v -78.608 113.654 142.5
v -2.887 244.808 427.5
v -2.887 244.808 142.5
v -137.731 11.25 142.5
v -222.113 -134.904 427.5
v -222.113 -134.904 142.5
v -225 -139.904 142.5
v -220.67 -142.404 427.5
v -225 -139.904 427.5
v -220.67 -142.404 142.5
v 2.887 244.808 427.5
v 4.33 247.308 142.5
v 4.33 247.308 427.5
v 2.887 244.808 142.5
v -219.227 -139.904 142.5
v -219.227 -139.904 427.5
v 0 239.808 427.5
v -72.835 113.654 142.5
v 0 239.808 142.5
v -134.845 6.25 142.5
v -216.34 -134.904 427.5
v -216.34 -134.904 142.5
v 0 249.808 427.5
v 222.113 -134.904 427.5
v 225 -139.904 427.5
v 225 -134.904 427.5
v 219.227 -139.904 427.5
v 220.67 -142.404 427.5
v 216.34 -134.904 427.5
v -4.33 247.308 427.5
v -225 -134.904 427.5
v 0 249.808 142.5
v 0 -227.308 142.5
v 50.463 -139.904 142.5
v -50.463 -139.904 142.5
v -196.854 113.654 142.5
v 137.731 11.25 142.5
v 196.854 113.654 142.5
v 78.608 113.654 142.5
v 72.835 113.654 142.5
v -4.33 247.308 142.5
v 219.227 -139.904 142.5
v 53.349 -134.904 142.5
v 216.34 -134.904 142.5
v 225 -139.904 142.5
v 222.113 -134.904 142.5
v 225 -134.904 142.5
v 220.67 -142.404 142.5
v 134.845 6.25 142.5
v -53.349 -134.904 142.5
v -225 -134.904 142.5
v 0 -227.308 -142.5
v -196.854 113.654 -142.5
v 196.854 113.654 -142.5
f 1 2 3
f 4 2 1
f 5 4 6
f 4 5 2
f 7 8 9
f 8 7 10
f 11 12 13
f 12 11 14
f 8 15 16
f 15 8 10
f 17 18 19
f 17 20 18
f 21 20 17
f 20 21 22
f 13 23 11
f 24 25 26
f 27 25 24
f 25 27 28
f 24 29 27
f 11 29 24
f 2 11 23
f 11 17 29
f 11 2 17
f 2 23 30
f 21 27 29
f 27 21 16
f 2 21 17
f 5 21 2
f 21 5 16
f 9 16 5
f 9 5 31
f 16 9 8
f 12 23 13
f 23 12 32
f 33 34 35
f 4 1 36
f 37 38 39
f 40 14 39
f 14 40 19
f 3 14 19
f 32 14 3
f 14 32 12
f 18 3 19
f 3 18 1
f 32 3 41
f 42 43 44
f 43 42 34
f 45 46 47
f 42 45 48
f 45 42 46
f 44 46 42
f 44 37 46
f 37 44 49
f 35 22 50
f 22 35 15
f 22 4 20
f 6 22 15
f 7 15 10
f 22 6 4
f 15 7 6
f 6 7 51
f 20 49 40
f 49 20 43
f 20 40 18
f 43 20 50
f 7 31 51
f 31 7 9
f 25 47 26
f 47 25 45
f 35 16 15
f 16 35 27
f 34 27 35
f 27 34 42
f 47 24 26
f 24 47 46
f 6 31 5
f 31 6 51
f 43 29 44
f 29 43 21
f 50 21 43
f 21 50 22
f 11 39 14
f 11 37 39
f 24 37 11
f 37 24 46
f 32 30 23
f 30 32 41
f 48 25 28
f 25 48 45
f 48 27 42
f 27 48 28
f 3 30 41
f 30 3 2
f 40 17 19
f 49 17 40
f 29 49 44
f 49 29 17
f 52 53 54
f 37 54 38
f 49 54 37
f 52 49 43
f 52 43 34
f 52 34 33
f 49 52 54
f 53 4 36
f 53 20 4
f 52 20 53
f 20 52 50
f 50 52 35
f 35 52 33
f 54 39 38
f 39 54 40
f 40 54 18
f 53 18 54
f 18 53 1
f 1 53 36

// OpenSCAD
// file: time_utility.scad
// Utility functions to help manage time steps $t
// 2017/04/28 - Roger Cheng

// Returns 0-1 for the portion of time between start/end.
function timeRanged(start, current, end) = 
    current<=start? 0 : 
        (current>=end ? 1 : 
            ((current-start)/(end-start)));

// Symmetric animation 0 to 1 to 0 while $t goes 0 to 1
function timeSymmetric() = abs($t-0.5)*2;

// A little padding on either end of timeSymmetric()
padStart=0.1;
padEnd=0.9;
function timePadded() = timeRanged(padStart, timeSymmetric(), padEnd);
// main file
// Triangular wedge tri-screen PC visualization
// Inspired by Star Trek (TOS) briefing room screen
// 2017/05/15 - Roger Cheng
use <time_utility.scad>

screenW = 450;
screenH = 285;
screenD = 5;

bodyW = screenW;
bodyH = screenH;

// Time utilities
function scrRise() = timeRanged(0, timePadded(), 0.2);
function scrMove() = timeRanged(0.2, timePadded(), 0.4);
function scrUnfold() = timeRanged(0.2, timePadded(), 0.4);
function scrWrap() = timeRanged(0.6, timePadded(), 1.0);
function screenDistance() = sqrt(3)*bodyW/6 + screenD;

// Physical construction
module screen()
{
  cube([screenW, screenH, screenD]);
}

module screenCenter()
{
  translate([-screenW/2, screenDistance(), -screenH/2])
  rotate([90, 0, 0])
  screen();
}

module screenLeft()
{
  // Screen hinge rotation
  translate([-screenW/2, screenDistance()-screenD, 0])
  rotate([0, 0, -140*scrWrap()])
  rotate([0, 0, -100*scrUnfold()])
  translate([screenW/2, -screenDistance()+screenD, 0])
  
  // Final position rotation
  rotate([0, 0, 120])
  screenCenter();
}

module screenRight()
{
  // Screen hinge rotation
  translate([screenW/2, screenDistance()-screenD, 0])
  rotate([0, 0, 140*scrWrap()])
  rotate([0, 0, 100*scrUnfold()])
  translate([-screenW/2, -screenDistance()+screenD, 0])
  
  rotate([0, 0, -120])
  screenCenter();
}

module screenAssembly()
{
  translate([0, -screenDistance()*scrWrap(), 0])
  translate([0, -screenDistance()*scrMove(), 0])
  translate([0, 0, screenH*scrRise()])
  union()
  {
    color([0.5, 0, 0]) screenLeft();
    color([0, 0.5, 0]) screenCenter();
    color([0, 0, 0.5]) screenRight();
  }
}

module bodyWedge()
{
  translate([0, sqrt(3)*bodyW/7, 0])
  cube([bodyW, bodyW, bodyH], center=true);
}

module bodyAssembly()
{
  intersection()
  {
    rotate([0, 0,   60]) bodyWedge();
    rotate([0, 0,  -60]) bodyWedge();
    rotate([0, 0,  180]) bodyWedge();
  }
}

module mainAssembly()
{
  screenAssembly();
  bodyAssembly();
}

mainAssembly();
